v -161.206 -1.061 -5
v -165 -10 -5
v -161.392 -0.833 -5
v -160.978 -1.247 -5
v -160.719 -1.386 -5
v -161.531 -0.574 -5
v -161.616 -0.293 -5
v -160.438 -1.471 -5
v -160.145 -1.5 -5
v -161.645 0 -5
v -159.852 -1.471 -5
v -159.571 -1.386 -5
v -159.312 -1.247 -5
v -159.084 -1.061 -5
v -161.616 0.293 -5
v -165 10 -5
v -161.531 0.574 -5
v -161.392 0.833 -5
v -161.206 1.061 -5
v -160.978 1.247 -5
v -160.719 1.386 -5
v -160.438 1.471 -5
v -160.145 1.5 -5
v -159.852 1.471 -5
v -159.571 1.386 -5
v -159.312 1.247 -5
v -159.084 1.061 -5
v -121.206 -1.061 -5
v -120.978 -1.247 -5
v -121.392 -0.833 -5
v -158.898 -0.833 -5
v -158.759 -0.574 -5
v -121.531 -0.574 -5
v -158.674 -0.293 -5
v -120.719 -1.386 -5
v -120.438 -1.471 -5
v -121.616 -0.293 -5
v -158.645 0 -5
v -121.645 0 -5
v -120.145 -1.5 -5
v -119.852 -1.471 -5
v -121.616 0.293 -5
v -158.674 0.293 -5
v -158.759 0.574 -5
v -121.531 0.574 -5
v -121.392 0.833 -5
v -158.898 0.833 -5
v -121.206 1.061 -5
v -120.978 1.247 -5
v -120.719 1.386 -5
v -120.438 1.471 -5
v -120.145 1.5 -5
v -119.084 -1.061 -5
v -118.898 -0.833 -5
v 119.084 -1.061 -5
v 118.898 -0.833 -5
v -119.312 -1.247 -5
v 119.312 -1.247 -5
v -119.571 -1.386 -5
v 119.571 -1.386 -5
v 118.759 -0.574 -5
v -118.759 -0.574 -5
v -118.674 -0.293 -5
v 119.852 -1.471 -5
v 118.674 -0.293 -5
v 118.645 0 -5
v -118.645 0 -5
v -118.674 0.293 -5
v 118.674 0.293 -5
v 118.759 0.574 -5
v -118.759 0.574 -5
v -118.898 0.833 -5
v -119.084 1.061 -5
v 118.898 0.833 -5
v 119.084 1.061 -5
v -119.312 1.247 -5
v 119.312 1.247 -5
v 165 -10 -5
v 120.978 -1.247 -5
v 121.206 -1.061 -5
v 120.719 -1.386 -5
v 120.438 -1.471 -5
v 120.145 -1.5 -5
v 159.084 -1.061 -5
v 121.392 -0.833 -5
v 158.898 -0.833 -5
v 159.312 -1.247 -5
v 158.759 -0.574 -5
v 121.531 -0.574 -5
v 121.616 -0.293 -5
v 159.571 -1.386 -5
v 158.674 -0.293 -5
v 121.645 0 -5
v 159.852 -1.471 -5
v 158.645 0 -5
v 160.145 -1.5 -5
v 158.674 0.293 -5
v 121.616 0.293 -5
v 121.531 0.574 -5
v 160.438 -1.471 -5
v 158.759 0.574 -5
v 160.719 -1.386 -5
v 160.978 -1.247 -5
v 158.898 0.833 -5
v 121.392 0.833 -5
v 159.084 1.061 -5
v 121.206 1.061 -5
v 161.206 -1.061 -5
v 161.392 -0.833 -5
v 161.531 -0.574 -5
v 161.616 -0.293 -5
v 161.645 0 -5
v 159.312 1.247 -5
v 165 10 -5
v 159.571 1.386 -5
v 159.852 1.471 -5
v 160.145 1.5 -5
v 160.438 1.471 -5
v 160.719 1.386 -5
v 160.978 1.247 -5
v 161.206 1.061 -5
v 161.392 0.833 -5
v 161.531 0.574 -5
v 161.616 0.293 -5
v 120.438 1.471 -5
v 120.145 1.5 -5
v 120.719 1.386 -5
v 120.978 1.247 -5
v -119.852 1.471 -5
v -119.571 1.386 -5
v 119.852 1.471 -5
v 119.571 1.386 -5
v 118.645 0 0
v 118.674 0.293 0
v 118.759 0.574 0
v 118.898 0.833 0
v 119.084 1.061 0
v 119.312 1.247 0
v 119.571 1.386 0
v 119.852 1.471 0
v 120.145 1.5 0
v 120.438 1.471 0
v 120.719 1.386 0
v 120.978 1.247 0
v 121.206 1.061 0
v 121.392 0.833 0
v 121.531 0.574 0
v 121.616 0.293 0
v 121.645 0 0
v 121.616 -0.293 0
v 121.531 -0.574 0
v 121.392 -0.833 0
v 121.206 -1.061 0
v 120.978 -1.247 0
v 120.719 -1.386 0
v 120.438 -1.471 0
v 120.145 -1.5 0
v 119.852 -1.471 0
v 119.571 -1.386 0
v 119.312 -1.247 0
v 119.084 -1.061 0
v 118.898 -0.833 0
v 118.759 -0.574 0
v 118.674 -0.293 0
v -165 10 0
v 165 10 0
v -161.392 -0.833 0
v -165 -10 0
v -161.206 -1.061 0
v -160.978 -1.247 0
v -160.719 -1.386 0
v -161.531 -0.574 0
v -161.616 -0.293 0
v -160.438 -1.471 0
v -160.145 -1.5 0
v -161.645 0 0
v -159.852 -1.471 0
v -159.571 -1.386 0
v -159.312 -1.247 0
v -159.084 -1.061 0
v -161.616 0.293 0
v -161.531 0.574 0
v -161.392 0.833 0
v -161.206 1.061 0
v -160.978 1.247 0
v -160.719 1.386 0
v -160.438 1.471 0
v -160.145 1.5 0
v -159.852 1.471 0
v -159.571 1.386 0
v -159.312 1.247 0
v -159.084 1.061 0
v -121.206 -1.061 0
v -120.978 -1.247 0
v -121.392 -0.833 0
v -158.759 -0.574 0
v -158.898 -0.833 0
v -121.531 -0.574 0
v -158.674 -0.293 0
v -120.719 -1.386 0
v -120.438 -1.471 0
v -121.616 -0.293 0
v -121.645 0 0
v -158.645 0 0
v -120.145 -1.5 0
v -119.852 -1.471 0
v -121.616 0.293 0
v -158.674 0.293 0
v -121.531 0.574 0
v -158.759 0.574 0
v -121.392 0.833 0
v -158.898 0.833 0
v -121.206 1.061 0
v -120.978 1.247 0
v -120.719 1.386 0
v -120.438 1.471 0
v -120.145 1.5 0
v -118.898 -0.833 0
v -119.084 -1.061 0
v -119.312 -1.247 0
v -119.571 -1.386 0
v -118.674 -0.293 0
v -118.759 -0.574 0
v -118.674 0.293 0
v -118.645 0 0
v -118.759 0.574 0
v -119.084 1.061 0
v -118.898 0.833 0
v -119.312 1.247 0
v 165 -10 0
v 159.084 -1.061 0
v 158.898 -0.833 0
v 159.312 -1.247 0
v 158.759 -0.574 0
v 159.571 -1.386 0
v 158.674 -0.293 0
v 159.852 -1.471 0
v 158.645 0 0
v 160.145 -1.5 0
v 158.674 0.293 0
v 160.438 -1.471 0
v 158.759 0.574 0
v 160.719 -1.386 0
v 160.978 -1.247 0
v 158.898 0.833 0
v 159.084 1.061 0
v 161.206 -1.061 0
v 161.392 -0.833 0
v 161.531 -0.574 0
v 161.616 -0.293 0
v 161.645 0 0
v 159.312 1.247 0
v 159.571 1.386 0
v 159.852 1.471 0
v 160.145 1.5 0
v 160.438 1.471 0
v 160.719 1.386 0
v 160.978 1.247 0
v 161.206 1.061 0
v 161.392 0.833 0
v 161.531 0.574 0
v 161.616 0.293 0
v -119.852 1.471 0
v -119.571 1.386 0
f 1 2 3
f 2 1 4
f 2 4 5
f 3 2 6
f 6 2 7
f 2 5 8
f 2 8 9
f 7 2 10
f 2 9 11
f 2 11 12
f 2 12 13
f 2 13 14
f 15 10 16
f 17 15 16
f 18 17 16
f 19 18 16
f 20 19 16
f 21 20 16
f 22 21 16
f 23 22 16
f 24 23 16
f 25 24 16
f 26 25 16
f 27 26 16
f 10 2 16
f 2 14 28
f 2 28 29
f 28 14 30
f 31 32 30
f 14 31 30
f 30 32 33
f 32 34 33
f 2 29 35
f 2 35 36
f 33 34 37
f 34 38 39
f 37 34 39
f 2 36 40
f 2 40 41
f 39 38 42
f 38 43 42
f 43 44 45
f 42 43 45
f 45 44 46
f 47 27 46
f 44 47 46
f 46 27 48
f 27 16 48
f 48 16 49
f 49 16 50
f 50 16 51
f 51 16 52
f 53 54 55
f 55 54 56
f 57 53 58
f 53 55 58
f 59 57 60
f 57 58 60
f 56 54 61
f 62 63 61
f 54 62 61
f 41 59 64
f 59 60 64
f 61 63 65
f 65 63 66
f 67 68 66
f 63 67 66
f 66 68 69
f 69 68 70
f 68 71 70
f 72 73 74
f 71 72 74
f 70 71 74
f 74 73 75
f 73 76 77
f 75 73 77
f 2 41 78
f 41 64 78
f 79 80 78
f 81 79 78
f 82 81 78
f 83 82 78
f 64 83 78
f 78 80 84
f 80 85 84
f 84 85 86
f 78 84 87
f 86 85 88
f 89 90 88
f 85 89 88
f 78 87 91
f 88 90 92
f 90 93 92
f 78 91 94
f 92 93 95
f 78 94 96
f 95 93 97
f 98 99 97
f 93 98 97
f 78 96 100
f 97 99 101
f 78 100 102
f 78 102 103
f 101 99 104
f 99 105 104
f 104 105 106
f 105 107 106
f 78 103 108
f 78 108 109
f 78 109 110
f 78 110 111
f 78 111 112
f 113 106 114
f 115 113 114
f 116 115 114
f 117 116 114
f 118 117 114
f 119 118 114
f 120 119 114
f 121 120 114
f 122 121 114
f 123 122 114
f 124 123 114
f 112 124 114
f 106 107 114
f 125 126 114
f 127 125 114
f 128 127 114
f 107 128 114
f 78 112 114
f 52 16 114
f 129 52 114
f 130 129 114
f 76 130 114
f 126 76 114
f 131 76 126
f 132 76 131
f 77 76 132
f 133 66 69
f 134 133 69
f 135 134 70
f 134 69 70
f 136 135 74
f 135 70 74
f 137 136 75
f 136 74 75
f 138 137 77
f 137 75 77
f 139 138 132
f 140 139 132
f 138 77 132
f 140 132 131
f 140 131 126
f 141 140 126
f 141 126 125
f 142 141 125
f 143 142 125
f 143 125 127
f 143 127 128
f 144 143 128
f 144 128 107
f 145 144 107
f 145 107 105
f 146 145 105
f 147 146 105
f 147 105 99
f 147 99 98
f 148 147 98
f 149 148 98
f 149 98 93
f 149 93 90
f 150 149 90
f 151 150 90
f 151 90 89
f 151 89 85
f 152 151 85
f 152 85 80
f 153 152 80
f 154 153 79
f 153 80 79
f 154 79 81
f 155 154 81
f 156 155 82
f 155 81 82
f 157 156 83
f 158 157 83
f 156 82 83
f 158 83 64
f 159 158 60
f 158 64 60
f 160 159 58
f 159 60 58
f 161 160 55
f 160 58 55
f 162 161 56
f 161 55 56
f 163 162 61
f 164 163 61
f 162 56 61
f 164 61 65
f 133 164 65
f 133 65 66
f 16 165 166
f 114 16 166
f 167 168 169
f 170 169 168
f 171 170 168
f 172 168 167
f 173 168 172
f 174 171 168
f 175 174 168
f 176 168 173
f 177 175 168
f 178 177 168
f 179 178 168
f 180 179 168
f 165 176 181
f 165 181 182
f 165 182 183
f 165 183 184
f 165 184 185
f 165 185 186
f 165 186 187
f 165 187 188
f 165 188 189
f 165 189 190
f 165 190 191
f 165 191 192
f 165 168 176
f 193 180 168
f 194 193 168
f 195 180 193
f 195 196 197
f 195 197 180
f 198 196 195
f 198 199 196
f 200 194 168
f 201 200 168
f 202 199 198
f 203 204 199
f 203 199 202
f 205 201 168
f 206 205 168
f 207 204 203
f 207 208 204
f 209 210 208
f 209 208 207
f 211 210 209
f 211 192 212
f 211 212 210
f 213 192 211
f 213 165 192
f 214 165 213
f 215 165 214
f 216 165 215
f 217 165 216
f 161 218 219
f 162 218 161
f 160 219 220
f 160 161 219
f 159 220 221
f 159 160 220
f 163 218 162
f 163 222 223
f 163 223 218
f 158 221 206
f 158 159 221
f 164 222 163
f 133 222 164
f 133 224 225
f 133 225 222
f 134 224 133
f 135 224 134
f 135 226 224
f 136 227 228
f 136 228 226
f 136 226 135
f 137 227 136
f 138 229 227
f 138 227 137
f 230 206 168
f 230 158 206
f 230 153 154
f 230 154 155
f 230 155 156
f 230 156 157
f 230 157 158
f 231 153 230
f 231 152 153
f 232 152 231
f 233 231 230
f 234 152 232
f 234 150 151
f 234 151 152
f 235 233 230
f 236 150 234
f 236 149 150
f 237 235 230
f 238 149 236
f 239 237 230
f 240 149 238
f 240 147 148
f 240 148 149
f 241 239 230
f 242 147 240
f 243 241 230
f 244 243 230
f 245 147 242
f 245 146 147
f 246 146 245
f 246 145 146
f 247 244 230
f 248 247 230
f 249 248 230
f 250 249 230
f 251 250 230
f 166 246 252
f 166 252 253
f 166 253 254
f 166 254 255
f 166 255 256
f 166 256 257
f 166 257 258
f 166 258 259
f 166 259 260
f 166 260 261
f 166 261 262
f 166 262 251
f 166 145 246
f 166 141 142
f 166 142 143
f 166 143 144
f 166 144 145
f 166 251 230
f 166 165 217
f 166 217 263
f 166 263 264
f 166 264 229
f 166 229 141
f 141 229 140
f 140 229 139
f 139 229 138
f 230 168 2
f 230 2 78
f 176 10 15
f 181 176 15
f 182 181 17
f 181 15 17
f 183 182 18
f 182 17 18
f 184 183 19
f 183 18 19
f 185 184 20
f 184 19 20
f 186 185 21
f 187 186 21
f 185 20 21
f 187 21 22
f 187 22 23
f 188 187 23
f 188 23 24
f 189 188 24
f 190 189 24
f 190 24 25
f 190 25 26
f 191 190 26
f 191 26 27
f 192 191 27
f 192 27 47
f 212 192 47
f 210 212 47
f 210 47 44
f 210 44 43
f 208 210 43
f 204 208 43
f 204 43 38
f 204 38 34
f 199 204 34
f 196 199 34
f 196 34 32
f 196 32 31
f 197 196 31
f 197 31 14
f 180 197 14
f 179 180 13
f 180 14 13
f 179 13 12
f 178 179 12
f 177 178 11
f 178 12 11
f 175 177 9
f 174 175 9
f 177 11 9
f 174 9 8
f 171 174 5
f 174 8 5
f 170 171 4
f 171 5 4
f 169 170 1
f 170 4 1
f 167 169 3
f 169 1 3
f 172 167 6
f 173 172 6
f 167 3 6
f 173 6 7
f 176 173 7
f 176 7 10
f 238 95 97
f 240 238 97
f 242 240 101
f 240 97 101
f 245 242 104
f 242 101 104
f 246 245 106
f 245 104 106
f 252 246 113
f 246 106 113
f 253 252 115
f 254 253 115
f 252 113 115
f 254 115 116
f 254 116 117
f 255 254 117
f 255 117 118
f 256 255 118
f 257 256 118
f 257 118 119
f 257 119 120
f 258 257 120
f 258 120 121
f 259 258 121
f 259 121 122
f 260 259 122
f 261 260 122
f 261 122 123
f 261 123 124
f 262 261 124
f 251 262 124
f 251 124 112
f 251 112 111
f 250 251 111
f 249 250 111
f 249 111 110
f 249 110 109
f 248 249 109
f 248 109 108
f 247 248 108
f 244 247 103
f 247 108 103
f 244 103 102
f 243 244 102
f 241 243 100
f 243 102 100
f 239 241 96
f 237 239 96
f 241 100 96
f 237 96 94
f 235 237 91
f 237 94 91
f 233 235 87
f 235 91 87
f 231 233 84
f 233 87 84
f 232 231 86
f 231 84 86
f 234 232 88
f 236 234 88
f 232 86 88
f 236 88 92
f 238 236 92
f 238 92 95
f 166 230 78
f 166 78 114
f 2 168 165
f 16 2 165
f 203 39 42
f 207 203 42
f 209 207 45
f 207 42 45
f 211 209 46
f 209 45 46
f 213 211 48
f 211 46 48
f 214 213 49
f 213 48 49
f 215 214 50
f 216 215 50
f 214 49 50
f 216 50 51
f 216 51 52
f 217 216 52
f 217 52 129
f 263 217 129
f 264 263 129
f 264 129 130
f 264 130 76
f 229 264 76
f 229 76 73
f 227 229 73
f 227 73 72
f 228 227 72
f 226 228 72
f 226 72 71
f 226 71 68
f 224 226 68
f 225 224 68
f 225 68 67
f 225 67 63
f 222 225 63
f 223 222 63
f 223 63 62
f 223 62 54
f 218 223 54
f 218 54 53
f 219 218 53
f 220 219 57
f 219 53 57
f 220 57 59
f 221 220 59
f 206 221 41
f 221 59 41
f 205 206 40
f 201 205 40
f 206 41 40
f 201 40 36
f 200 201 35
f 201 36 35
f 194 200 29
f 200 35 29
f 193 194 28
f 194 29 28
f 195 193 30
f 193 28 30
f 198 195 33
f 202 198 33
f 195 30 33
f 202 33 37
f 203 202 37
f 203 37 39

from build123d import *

# Parameters (mm, degrees)
F0_W     = 330
F0_H     = 20
F1_DEPTH = 5
F2_D     = 3
F3_D     = 3


with BuildPart() as f1:
    # F0 (on Top) → F1 (new body)
    with BuildSketch(Plane.XY):
        Rectangle(F0_W, F0_H)
    extrude(amount=-F1_DEPTH)

    # F2 (through all)
    with Locations(Plane.XY):
        with Locations((-160.145, 0), (160.145, 0)):
            Hole(F2_D / 2)

    # F3 (through all)
    with Locations(Plane.XY):
        with Locations((-120.145, 0), (120.145, 0)):
            Hole(F3_D / 2)


solid = f1.part
